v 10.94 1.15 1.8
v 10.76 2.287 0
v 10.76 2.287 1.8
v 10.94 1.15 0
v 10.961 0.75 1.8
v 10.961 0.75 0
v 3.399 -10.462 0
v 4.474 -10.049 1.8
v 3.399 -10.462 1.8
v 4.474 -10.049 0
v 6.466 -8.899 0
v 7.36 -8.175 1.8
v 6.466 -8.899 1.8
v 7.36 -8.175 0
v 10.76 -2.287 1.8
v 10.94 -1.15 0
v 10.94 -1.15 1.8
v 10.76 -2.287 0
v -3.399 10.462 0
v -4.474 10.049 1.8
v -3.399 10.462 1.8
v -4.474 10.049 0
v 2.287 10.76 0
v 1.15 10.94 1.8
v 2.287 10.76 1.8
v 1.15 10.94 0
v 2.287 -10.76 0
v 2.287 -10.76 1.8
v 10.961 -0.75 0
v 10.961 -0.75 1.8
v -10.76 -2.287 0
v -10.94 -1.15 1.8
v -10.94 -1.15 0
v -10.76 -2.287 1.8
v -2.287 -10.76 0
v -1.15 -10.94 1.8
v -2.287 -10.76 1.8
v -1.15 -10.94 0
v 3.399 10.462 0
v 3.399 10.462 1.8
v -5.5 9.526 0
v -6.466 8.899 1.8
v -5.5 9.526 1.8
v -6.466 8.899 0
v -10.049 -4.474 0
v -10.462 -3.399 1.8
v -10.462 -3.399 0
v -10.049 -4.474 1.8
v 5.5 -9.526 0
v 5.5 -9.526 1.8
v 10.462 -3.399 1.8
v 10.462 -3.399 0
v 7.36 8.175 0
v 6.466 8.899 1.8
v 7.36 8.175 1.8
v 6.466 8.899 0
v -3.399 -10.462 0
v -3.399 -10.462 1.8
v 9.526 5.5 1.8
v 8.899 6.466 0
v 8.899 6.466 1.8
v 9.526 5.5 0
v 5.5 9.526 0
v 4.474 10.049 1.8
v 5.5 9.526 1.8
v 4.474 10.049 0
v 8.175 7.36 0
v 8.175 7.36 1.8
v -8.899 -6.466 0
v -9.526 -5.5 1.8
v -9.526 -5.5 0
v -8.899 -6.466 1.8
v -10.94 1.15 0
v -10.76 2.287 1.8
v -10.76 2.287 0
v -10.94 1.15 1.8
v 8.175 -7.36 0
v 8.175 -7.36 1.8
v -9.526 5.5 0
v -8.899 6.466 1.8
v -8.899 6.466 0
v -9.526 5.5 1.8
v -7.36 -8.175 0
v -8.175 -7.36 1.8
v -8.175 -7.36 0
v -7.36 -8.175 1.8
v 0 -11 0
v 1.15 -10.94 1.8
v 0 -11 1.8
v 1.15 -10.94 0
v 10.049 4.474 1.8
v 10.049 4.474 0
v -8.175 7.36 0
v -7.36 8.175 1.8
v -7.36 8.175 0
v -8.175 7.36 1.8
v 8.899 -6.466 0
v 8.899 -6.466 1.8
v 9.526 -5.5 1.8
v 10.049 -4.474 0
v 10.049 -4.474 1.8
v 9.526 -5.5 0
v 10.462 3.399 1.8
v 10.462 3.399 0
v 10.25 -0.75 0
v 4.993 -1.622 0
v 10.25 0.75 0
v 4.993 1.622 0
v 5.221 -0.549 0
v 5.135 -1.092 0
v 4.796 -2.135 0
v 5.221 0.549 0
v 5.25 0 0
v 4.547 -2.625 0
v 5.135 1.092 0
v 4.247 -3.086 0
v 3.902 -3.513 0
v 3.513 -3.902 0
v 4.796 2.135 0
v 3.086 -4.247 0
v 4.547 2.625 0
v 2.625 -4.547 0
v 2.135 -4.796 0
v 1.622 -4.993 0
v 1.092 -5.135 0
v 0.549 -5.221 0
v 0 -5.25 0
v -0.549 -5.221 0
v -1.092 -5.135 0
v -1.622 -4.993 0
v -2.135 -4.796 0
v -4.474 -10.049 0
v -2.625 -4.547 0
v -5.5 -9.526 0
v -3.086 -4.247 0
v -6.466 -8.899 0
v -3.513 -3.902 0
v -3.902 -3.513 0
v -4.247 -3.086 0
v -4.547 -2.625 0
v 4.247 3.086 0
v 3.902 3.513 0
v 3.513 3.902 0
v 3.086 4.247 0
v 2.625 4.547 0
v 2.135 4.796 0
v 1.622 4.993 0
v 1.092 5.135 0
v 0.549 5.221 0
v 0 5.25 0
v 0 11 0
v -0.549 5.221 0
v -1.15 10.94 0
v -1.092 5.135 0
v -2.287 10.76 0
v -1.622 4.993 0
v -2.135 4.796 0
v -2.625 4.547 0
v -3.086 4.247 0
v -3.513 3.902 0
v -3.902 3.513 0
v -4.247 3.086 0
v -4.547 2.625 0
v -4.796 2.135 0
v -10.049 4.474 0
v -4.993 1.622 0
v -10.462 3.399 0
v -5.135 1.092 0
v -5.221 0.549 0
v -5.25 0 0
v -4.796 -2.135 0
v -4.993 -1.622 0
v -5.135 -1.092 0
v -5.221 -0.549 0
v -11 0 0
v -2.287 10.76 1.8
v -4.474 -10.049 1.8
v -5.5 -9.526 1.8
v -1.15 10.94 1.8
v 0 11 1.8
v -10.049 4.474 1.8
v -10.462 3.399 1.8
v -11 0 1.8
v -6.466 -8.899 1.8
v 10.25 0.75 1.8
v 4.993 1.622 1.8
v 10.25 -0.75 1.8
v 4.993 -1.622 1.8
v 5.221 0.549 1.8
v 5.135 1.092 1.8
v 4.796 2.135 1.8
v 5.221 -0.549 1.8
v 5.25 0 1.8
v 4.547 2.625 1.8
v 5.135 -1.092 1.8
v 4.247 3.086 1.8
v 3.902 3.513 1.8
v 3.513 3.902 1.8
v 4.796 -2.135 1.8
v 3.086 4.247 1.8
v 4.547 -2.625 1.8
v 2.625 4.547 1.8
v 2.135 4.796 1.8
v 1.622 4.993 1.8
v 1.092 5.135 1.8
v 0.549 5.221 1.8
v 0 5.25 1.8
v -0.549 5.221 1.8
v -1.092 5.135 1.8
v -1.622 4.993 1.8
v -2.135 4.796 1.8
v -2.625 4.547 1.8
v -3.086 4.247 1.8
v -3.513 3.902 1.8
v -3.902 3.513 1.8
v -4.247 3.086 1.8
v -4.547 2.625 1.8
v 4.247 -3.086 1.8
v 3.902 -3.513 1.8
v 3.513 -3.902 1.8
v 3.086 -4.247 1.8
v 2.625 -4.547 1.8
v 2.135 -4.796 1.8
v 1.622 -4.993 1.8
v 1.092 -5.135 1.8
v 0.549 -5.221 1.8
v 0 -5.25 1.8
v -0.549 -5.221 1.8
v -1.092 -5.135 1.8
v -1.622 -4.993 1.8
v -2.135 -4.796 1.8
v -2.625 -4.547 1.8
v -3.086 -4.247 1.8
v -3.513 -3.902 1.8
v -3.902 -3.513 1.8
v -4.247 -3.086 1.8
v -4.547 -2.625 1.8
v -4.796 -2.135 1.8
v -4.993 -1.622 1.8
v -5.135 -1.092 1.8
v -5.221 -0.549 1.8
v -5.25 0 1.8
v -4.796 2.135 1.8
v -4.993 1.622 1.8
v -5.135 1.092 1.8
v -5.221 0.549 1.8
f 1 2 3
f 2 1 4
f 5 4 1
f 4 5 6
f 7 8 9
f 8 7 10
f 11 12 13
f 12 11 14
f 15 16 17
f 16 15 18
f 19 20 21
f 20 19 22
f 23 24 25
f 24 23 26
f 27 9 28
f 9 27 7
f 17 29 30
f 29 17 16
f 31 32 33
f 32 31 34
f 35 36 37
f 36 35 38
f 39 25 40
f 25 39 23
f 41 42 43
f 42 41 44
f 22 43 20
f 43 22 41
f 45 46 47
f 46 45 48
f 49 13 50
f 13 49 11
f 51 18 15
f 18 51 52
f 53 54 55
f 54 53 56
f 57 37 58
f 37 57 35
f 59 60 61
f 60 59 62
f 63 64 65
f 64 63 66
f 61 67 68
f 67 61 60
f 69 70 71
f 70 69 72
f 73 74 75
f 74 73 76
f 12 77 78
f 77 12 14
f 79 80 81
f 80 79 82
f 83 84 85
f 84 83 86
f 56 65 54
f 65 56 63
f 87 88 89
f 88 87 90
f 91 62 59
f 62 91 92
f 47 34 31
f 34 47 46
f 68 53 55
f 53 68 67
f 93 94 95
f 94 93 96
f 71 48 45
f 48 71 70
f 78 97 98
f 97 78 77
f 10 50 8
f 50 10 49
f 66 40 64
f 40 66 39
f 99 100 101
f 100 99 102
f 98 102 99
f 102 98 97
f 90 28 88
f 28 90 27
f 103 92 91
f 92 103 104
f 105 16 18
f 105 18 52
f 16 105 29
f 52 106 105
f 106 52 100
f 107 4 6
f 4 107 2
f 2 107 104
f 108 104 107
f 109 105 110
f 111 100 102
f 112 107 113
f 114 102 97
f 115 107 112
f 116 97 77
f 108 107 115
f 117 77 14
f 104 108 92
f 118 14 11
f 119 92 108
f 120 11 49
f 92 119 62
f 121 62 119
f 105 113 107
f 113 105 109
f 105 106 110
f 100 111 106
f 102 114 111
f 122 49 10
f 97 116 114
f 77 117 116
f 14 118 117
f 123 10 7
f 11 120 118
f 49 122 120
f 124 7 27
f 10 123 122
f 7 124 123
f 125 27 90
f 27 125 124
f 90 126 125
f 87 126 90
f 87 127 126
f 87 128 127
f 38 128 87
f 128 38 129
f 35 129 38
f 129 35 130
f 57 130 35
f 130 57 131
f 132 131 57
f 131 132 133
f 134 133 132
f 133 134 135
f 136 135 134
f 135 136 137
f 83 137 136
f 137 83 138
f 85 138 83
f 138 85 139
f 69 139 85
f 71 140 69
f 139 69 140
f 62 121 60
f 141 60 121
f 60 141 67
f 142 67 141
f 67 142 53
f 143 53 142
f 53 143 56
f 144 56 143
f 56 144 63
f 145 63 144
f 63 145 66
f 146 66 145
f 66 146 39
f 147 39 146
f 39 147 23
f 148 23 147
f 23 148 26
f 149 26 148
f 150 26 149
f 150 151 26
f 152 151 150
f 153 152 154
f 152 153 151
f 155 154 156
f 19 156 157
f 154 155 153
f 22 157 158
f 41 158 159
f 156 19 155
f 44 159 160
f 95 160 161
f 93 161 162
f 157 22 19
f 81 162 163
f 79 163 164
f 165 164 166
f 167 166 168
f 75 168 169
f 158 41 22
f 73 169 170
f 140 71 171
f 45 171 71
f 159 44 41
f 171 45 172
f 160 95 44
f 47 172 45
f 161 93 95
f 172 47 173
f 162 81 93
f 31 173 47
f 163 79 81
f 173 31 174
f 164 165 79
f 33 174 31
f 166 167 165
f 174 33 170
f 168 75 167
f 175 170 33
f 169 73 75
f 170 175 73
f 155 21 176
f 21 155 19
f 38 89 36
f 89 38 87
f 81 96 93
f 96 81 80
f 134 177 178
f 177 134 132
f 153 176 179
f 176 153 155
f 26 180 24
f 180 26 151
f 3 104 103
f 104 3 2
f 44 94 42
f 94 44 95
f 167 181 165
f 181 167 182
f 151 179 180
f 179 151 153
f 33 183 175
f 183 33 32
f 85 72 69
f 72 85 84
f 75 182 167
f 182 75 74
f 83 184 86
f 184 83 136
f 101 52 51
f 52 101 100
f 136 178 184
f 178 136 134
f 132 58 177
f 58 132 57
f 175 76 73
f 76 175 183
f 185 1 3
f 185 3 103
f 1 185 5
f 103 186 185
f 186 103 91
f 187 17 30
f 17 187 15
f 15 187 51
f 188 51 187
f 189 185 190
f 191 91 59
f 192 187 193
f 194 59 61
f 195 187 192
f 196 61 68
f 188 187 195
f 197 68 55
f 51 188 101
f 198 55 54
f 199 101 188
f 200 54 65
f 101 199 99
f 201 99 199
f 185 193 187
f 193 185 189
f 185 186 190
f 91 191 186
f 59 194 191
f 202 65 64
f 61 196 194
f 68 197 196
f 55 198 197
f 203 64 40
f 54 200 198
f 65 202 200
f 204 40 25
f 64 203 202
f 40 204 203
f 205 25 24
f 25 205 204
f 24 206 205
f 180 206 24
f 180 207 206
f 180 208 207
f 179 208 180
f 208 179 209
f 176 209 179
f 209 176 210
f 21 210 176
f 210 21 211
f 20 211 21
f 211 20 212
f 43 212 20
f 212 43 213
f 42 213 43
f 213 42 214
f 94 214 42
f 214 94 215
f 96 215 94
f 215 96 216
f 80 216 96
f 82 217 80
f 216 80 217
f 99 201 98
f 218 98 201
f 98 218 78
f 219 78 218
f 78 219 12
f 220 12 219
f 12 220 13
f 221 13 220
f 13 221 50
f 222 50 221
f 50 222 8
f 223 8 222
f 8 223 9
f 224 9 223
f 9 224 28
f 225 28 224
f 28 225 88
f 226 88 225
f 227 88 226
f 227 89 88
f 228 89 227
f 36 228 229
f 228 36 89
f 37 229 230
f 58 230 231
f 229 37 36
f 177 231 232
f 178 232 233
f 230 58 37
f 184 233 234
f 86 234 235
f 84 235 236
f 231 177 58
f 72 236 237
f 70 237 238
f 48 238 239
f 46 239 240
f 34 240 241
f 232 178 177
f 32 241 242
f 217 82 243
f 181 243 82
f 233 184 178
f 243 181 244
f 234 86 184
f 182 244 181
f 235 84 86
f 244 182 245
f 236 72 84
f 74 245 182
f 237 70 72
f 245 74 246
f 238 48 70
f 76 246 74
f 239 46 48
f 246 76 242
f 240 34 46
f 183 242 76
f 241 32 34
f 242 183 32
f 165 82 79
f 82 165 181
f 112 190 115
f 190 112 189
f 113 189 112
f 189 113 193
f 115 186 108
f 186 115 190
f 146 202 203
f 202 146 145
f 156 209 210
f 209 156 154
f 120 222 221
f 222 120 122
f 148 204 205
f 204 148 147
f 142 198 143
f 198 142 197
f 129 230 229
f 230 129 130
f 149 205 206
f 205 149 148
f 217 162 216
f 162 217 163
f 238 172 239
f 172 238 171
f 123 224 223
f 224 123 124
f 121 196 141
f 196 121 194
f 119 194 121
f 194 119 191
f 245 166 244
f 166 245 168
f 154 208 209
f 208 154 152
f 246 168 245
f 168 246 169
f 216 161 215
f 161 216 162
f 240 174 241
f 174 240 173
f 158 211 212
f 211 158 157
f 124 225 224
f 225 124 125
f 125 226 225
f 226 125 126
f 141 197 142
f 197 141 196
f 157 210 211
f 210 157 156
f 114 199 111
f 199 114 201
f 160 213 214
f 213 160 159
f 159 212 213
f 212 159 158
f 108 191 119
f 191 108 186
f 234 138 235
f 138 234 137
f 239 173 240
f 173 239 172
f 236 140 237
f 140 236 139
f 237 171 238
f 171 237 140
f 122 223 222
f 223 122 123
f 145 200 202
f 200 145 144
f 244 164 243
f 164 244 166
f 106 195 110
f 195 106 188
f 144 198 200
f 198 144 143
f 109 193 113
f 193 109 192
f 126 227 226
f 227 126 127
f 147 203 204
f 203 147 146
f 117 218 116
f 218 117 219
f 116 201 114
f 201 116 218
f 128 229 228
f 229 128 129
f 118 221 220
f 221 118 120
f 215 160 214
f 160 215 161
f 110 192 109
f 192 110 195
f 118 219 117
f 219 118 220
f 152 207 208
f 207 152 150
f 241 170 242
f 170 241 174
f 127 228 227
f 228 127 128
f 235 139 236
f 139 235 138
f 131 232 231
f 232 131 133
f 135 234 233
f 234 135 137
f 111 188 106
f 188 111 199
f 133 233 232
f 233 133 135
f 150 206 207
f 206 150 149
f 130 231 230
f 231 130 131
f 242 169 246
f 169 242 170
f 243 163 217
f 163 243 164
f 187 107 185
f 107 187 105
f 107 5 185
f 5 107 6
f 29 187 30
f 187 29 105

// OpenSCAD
// Split lock washer.
$fn = 60;
eps = 0.02;
inner_d = 10.5;
outer_d = 22;
thickness = 1.8;
gap = 1.5;
difference() {
    cylinder(d=outer_d,h=thickness);
    translate([0,0,-eps]) cylinder(d=inner_d,h=thickness+2*eps);
    translate([outer_d/2-gap/2,-gap/2,-eps]) cube([gap+eps,gap,thickness+2*eps]);
}
